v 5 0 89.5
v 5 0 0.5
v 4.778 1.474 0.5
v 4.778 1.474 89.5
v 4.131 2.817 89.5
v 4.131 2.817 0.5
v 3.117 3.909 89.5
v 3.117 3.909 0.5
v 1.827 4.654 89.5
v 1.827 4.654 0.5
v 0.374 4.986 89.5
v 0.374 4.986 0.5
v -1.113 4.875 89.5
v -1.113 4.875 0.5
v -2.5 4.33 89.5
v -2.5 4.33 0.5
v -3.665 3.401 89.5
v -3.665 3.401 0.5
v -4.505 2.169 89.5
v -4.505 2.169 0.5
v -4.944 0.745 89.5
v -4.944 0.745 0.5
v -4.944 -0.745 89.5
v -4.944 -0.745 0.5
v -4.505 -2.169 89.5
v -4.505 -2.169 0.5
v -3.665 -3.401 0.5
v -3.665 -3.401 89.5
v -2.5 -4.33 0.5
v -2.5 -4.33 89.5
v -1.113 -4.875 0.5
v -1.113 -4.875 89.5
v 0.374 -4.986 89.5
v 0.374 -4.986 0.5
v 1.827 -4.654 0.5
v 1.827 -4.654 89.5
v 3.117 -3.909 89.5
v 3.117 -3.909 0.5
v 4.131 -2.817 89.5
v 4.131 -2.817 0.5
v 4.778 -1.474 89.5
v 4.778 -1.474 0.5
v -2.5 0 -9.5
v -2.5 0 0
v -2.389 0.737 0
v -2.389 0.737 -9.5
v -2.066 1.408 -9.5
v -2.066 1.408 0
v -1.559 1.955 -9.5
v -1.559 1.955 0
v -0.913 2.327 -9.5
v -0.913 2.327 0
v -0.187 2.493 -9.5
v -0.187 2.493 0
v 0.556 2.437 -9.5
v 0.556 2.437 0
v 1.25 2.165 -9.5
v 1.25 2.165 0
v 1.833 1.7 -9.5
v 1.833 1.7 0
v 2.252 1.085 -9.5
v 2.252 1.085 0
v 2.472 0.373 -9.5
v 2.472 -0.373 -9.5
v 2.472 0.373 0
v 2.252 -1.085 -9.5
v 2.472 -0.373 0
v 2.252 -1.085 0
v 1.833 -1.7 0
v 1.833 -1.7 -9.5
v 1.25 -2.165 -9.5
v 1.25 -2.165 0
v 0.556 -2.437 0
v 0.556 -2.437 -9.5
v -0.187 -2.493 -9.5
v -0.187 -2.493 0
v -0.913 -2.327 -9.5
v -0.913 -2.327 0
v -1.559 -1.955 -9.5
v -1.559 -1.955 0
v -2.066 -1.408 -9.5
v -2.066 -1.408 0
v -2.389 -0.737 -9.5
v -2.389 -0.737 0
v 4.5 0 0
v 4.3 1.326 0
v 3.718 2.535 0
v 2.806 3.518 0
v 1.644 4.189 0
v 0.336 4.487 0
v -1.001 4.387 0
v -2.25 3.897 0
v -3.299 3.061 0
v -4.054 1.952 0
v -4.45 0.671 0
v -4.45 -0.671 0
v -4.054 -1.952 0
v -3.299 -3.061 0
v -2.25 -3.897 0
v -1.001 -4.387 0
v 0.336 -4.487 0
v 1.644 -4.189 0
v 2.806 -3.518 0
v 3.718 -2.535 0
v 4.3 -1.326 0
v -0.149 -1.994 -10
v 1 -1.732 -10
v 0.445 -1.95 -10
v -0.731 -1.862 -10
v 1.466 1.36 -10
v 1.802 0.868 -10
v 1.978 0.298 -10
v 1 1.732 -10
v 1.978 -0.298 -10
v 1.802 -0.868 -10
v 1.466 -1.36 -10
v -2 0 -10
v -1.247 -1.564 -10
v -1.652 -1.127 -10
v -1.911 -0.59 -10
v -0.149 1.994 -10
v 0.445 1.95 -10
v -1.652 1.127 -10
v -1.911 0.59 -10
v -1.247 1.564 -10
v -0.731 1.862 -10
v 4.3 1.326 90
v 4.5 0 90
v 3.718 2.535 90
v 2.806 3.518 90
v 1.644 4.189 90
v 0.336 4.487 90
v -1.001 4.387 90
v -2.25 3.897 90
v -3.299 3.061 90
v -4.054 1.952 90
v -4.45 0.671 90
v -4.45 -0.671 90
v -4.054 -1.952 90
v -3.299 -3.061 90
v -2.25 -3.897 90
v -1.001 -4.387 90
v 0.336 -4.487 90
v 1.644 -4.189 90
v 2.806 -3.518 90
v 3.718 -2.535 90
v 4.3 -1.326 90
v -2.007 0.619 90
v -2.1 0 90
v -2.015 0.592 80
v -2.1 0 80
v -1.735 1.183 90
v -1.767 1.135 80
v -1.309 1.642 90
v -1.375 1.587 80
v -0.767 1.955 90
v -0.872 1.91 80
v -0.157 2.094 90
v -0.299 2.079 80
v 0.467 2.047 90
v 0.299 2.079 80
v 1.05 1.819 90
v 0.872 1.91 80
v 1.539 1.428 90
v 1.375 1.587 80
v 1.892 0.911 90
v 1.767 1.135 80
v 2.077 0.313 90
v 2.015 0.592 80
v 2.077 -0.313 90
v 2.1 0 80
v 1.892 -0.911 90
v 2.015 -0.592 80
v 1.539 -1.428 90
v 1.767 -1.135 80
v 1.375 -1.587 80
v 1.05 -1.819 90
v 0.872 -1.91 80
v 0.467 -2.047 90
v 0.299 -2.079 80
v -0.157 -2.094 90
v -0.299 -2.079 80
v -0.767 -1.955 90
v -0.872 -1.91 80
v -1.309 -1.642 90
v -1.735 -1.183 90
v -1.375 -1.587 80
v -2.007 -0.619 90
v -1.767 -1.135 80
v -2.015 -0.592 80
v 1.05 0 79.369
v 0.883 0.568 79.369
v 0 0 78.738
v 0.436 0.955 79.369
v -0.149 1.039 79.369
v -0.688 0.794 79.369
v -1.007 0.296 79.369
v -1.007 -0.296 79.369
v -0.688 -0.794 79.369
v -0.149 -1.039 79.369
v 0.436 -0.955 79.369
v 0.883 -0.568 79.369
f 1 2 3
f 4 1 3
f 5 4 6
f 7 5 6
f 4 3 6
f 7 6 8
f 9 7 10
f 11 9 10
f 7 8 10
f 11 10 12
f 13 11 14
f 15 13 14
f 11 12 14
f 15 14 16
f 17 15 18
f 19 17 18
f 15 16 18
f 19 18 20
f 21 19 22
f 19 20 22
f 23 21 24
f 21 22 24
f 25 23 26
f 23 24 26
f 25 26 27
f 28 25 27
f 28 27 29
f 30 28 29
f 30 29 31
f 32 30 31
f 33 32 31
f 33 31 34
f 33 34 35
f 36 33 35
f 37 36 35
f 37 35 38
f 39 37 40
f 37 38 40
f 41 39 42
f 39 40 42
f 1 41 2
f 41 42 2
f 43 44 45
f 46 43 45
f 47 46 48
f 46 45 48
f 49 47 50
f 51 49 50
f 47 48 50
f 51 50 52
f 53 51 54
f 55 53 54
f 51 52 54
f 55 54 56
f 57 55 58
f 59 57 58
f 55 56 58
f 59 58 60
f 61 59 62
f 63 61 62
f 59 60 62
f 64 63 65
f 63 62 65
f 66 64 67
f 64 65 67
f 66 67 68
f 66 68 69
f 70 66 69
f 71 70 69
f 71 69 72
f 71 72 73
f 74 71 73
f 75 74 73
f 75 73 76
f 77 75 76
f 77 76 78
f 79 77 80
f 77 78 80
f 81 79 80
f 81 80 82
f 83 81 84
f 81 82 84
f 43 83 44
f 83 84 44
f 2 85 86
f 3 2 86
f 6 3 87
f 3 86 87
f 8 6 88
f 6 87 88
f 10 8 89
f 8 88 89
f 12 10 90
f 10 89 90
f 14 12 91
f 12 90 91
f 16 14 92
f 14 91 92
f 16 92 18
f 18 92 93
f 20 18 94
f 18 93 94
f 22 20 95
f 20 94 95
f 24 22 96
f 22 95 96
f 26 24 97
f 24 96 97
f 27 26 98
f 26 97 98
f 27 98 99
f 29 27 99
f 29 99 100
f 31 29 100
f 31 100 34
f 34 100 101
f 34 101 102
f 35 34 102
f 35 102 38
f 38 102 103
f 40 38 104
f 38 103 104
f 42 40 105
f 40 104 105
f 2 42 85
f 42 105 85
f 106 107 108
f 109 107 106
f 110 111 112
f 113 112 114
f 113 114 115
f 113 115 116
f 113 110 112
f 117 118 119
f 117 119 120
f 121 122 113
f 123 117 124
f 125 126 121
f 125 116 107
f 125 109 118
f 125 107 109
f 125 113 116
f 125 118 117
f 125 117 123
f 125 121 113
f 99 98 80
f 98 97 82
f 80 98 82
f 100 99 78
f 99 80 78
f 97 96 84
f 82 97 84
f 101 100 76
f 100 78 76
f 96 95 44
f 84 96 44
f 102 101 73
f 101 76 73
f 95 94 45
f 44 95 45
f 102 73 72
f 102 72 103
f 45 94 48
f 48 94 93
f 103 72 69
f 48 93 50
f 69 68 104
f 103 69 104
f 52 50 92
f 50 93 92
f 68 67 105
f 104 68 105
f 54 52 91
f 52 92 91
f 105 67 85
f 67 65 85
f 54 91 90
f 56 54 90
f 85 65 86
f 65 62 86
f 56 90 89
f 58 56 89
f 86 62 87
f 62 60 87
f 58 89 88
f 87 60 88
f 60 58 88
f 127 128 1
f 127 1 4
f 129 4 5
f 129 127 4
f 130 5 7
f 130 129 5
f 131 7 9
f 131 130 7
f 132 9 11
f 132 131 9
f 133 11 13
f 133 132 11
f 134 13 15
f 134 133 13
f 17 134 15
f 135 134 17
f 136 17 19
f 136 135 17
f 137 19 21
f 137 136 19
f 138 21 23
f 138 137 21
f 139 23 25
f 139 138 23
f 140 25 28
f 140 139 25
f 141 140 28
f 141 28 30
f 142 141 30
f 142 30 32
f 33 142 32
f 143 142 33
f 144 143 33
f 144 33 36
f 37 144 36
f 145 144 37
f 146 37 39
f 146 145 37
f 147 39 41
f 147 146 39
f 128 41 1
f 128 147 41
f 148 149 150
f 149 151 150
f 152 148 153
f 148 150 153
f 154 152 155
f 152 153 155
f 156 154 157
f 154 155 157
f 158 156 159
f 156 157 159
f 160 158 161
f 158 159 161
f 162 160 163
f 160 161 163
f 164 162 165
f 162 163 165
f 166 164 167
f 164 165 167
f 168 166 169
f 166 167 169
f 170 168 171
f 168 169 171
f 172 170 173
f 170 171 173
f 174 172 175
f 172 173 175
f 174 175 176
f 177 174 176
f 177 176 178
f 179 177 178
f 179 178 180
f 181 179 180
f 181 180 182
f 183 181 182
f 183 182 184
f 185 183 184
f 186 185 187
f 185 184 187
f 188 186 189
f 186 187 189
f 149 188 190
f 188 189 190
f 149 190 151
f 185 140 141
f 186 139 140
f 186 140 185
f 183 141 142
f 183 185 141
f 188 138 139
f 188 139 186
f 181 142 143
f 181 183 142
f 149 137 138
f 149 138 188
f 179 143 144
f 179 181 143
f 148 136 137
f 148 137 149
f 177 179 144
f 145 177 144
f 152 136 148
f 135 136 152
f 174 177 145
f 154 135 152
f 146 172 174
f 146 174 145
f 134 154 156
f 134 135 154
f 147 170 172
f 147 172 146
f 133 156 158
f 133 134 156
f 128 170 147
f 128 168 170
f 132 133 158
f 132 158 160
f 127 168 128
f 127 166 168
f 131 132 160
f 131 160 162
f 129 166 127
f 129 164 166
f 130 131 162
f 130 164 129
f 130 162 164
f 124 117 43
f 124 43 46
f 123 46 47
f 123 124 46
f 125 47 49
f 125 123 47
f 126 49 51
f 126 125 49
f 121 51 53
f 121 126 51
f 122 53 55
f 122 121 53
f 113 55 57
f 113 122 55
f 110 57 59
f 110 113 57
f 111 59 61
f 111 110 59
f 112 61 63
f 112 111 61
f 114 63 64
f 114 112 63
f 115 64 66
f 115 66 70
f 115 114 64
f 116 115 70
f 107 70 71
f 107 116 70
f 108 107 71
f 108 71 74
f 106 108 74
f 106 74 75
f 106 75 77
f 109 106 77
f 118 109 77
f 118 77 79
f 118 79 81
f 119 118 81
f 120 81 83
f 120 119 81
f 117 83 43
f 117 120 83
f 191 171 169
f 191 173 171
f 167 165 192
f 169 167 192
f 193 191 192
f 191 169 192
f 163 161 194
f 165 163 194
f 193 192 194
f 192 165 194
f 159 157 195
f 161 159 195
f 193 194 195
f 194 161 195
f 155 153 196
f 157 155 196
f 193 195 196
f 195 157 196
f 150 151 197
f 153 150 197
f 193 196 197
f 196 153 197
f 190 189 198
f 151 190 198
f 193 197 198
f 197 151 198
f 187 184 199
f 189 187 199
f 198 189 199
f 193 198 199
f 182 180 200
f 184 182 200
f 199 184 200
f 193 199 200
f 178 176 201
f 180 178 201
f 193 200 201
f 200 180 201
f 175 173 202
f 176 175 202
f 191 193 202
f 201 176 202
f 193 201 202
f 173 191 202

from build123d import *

# Parameters (mm, degrees)
ESQUISSE1_R                                   = 5
BOSS_EXTRU_1_DEPTH                            = 90
ESQUISSE2_R                                   = 2.5
BOSS_EXTRU_2_DEPTH                            = 10
TROU_POUR_TARAUDAGE_POUR_TROU_TARAUD_M5_D     = 4.2
TROU_POUR_TARAUDAGE_POUR_TROU_TARAUD_M5_DEPTH = 10
TROU_POUR_TARAUDAGE_POUR_TROU_TARAUD_M5_TIP   = 1.2618073
CHANFREIN1_SIZE                               = 0.5


with BuildPart() as part:
    # Esquisse1 → Boss.-Extru.1 (new body)
    with BuildSketch(Plane.XY):
        Circle(ESQUISSE1_R)
    extrude(amount=BOSS_EXTRU_1_DEPTH)

    # Esquisse2 → Boss.-Extru.2 (add)
    with BuildSketch(Plane(origin=(0, 0, 0), x_dir=(-1, 0, 0), z_dir=(0, 0, -1))):
        Circle(ESQUISSE2_R)
    extrude(amount=BOSS_EXTRU_2_DEPTH)

    # Trou pour taraudage pour trou taraudé M51
    with Locations(Plane.XY.offset(90)):
        with Locations((0, 0)):
            Hole(TROU_POUR_TARAUDAGE_POUR_TROU_TARAUD_M5_D / 2, depth=TROU_POUR_TARAUDAGE_POUR_TROU_TARAUD_M5_DEPTH)
            with Locations((0, 0, -(TROU_POUR_TARAUDAGE_POUR_TROU_TARAUD_M5_DEPTH + TROU_POUR_TARAUDAGE_POUR_TROU_TARAUD_M5_TIP / 2))):  # 118° drill point
                Cone(0, TROU_POUR_TARAUDAGE_POUR_TROU_TARAUD_M5_D / 2, TROU_POUR_TARAUDAGE_POUR_TROU_TARAUD_M5_TIP, mode=Mode.SUBTRACT)

    # Chanfrein1
    chanfrein1_edges = [part.edges().sort_by_distance(p)[0] for p in [
        (-5, 0, 0),
        (-5, 0, 90),
        (2.5, 0, -10),
    ]]
    chamfer(chanfrein1_edges, length=CHANFREIN1_SIZE)


solid = part.part
